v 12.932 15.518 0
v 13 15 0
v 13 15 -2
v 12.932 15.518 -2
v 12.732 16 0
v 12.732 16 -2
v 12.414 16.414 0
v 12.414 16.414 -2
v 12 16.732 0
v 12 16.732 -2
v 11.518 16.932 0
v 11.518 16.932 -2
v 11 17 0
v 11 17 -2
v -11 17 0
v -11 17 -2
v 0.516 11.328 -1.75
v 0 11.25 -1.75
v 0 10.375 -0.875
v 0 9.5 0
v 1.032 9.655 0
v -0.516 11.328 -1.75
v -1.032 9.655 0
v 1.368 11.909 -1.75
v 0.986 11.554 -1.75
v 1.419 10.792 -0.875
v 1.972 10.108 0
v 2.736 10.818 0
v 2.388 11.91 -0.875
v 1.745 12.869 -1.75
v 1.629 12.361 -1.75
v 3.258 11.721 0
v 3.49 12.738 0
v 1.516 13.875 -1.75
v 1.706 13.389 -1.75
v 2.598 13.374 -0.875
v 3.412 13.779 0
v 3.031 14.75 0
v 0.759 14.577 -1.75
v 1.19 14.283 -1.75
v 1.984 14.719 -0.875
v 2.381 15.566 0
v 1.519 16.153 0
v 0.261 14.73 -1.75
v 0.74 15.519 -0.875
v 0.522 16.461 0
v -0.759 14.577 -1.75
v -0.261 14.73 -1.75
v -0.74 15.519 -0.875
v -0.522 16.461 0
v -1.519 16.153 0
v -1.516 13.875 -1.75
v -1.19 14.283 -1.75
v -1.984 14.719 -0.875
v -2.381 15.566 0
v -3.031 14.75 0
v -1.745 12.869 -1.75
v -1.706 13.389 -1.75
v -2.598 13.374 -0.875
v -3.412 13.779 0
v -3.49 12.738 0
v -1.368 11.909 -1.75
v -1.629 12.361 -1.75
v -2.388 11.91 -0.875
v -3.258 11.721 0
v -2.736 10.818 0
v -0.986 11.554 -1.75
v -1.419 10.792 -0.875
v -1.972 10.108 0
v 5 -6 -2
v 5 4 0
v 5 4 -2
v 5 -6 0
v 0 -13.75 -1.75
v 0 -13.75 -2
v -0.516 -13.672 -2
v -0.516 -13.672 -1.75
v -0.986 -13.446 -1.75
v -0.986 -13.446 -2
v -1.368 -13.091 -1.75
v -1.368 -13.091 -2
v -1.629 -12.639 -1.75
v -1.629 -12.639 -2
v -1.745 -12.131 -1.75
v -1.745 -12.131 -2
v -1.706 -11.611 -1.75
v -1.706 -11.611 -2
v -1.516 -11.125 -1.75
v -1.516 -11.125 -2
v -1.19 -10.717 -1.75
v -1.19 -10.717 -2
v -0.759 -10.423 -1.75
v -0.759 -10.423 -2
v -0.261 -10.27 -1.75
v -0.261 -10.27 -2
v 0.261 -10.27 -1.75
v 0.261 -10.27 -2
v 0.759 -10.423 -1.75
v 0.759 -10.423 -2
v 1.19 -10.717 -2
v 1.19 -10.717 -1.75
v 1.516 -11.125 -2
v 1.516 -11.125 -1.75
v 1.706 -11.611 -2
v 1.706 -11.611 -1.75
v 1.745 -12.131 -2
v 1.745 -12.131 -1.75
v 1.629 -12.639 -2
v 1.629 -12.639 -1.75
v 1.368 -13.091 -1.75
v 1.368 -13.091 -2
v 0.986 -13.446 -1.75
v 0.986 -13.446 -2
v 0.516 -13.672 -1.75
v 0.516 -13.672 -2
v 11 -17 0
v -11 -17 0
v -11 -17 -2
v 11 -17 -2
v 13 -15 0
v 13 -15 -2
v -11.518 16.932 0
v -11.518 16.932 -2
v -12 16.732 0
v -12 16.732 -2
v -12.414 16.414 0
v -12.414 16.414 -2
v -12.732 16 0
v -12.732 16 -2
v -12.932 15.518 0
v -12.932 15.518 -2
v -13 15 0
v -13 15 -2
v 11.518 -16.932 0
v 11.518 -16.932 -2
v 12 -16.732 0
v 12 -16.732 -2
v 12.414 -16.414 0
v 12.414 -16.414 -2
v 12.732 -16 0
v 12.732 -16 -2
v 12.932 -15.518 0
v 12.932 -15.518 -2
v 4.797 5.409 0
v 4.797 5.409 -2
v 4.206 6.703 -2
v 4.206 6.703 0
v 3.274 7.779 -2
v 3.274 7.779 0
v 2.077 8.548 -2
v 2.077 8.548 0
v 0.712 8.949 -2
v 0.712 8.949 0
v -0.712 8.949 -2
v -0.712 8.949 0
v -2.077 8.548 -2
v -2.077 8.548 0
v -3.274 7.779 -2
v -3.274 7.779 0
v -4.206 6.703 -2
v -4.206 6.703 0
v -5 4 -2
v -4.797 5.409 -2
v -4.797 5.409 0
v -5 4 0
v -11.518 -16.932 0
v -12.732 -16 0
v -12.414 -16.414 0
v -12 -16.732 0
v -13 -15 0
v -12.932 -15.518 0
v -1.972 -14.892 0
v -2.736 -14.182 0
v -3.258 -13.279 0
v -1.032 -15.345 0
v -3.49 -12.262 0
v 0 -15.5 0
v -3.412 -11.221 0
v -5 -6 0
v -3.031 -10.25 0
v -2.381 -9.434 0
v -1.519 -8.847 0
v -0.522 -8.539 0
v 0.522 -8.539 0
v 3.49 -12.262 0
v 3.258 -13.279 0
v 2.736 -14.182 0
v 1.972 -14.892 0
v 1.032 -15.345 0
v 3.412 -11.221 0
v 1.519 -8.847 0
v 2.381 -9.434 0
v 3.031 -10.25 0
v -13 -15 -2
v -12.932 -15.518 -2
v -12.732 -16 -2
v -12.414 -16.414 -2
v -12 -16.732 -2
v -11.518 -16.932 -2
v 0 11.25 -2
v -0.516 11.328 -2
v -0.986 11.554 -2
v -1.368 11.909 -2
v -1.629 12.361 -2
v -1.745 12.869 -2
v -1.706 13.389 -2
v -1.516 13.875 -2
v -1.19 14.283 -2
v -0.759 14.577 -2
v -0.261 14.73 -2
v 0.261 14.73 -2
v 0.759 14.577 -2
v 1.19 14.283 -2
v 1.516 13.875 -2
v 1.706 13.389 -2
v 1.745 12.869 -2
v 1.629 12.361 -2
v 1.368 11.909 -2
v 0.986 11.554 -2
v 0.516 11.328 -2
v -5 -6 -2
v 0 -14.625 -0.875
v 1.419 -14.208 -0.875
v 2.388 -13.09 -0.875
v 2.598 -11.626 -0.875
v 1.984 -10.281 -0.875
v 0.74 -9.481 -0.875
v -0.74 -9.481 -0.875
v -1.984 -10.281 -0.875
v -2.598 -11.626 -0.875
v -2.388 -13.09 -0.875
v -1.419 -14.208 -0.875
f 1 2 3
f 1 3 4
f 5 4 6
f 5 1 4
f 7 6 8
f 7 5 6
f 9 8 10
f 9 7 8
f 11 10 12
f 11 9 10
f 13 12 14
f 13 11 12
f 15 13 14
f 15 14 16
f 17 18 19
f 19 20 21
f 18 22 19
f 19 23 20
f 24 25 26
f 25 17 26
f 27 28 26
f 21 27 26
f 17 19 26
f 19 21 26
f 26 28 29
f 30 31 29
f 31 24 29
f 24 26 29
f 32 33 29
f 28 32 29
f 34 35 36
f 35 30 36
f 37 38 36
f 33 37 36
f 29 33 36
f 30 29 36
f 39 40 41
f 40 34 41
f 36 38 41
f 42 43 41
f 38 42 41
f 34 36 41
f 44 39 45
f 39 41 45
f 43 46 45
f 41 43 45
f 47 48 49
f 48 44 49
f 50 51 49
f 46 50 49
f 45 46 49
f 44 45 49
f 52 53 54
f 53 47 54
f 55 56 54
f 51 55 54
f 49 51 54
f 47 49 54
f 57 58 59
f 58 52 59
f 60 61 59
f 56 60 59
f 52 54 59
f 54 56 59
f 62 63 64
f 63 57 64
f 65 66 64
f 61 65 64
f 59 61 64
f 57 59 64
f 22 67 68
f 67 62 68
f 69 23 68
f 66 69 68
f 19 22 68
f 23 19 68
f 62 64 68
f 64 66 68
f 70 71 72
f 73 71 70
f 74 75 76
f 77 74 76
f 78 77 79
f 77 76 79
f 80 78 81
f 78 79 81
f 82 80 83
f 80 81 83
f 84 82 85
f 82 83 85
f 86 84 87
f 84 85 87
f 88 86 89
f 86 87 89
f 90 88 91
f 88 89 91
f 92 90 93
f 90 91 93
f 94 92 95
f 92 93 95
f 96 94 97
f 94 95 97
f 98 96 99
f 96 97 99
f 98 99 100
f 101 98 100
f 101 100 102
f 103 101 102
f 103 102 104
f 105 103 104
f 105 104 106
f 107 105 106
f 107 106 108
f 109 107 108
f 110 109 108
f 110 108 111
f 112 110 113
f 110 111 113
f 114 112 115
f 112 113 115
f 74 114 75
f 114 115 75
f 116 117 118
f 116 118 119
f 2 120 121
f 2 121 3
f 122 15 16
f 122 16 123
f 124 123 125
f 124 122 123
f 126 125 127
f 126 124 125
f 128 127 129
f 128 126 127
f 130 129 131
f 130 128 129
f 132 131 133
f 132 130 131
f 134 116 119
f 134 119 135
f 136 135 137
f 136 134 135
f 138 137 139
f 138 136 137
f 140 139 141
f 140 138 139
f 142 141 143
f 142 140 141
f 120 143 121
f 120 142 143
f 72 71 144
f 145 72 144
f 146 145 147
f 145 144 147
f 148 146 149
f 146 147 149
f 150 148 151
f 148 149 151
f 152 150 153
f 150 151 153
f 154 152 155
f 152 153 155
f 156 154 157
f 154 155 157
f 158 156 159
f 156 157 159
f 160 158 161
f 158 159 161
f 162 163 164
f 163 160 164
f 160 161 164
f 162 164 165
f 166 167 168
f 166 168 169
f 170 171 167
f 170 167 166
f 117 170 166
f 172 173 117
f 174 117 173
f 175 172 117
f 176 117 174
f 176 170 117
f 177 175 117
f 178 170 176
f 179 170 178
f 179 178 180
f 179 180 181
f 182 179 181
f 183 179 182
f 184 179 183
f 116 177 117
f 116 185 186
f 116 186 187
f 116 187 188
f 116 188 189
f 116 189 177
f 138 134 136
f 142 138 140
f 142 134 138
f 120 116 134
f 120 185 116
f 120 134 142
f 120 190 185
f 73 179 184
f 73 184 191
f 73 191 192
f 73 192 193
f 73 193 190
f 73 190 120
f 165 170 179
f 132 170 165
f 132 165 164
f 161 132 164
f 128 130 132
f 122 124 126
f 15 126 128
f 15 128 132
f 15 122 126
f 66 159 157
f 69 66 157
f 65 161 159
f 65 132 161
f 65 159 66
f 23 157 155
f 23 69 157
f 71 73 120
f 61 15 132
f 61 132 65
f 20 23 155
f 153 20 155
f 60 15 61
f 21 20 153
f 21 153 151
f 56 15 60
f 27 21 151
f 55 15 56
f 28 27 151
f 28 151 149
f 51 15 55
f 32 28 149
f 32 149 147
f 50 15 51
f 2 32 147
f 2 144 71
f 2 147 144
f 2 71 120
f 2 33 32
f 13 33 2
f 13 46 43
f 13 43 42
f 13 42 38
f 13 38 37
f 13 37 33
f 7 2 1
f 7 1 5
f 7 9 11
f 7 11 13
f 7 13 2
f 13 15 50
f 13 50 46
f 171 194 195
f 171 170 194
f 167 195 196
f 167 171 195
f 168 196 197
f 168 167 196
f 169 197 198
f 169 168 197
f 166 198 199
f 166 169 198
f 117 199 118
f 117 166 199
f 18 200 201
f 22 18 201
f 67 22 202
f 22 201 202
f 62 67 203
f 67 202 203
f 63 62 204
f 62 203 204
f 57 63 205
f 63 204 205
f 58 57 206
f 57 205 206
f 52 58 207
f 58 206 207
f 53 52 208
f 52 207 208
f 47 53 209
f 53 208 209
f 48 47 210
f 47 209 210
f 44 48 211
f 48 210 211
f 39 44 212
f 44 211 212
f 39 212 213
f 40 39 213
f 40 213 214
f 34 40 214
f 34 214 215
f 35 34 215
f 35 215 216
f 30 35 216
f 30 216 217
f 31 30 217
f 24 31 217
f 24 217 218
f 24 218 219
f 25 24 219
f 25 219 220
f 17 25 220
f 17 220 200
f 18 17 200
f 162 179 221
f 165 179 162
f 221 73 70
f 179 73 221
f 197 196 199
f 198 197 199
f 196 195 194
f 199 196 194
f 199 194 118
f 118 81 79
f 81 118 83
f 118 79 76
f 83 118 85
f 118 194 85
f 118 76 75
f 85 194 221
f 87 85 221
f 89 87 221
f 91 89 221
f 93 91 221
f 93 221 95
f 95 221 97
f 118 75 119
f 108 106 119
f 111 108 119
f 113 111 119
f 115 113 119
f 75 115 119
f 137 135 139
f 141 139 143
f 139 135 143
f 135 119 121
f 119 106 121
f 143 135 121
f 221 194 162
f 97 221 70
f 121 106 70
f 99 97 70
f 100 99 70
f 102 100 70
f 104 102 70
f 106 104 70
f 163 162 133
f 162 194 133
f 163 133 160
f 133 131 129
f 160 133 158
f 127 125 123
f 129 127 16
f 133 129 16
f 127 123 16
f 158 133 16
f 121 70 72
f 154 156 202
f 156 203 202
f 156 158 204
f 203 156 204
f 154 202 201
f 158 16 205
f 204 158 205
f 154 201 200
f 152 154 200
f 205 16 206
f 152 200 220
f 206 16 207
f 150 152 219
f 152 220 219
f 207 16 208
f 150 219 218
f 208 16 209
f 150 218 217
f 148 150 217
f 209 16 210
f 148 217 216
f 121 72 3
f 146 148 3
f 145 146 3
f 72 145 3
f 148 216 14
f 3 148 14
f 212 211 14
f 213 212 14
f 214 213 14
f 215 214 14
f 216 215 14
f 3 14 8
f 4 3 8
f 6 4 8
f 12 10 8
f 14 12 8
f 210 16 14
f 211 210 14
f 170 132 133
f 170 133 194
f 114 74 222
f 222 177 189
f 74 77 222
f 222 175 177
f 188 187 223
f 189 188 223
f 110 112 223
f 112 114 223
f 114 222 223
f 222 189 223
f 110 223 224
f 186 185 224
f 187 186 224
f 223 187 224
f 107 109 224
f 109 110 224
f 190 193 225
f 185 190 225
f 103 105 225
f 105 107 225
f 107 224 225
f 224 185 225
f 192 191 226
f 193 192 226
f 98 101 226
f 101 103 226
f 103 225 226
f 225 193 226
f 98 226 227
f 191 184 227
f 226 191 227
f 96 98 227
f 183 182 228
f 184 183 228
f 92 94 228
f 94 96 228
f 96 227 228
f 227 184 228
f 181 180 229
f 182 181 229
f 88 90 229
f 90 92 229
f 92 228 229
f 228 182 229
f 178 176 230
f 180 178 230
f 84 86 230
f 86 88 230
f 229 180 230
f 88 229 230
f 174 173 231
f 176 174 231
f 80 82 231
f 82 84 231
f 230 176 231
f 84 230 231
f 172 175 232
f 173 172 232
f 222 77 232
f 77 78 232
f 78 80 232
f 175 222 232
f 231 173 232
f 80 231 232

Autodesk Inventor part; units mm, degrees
ref_plane "YZ Plane" through (0, 0, 0) normal (1, 0, 0) x (0, 1, 0)
ref_plane "XZ Plane" through (0, 0, 0) normal (0, 1, 0) x (-1, 0, 0)
ref_plane "XY Plane" through (0, 0, 0) normal (0, 0, 1) x (1, 0, 0)
sketch "Skizze1" plane through (0, 0, 0) normal (0, 0, 1) x (1, 0, 0)
  line L0 (-18.7799, 0) -> (18.7799, 0) projected
  line L1 (0, -24.3799) -> (0, 24.3799) projected
  line L2 (-11, -17) -> (11, -17)
  line L3 (13, -15) -> (13, 15)
  line L4 (11, 17) -> (-11, 17)
  line L5 (-13, 15) -> (-13, -15)
  line L6 (-13, -17) -> (13, 17) construction
  line L7 (13, -17) -> (-13, 17) construction
  arc A0 (-11, 17) -> (-13, 15) centre (-11, 15) ccw
  arc A1 (13, 15) -> (11, 17) centre (11, 15) ccw
  arc A2 (11, -17) -> (13, -15) centre (11, -15) ccw
  arc A3 (-13, -15) -> (-11, -17) centre (-11, -15) ccw
  point P0 (0, 0)
  dimension "d0" = 26
  dimension "d1" = 34
  dimension "d2" = 2
extrude "Extrusion1" add sketch "Skizze1" against normal blind 2
sketch "Skizze2" plane through (0, 0, 0) normal (0, 0, 1) x (1, 0, 0)
  line L0 (13, -15) -> (13, 15) projected
  arc A0 (13, 15) -> (11, 17) centre (11, 15) ccw projected
  line L1 (11, 17) -> (-11, 17) projected
  arc A1 (-11, 17) -> (-13, 15) centre (-11, 15) ccw projected
  line L2 (-13, 15) -> (-13, -15) projected
  arc A2 (-13, -15) -> (-11, -17) centre (-11, -15) ccw projected
  line L3 (-11, -17) -> (11, -17) projected
  arc A3 (11, -17) -> (13, -15) centre (11, -15) ccw projected
  line L4 (-18.7799, 0) -> (18.7799, 0) projected
  line L5 (0, -24.3799) -> (0, 24.3799) projected
  line L6 (-5, 4) -> (5, 4)
  line L7 (5, 4) -> (5, -6)
  line L8 (5, -6) -> (-5, -6)
  line L9 (-5, -6) -> (-5, 4)
  arc A4 (5, 4) -> (-5, 4) centre (0, 4) ccw
  point P0 (0, 0)
  dimension "d5" = 10
  dimension "d6" = 10
  dimension "d7" = 11
  dimension "d8" = 5
extrude "Extrusion2" cut sketch "Skizze2" against normal blind 2 contours L7 L8 L5 L4 | L4 L5 L6 L7 | L5 L8 L9 L4 | L4 L9 L6 L5 | L6 L5 A4 | L6 A4 L5
sketch "Skizze3" plane through (0, 0, 0) normal (0, 0, 1) x (1, 0, 0)
  line L0 (5, 4) -> (5, -6) projected
  line L1 (5, -6) -> (-5, -6) projected
  line L2 (-5, -6) -> (-5, 4) projected
  arc A0 (5, 4) -> (-5, 4) centre (0, 4) ccw projected
  line L3 (13, -15) -> (13, 15) projected
  arc A1 (13, 15) -> (11, 17) centre (11, 15) ccw projected
  line L4 (11, 17) -> (-11, 17) projected
  arc A2 (-11, 17) -> (-13, 15) centre (-11, 15) ccw projected
  line L5 (-13, 15) -> (-13, -15) projected
  arc A3 (-13, -15) -> (-11, -17) centre (-11, -15) ccw projected
  line L6 (-11, -17) -> (11, -17) projected
  arc A4 (11, -17) -> (13, -15) centre (11, -15) ccw projected
  line L7 (-18.7799, 0) -> (18.7799, 0) projected
  line L8 (0, -24.3799) -> (0, 24.3799) projected
  point P0 (0, 0)
  point P1 (0, -12)
  point P2 (0, 13)
  dimension "d11" = 25
  dimension "d12" = 5
hole "Bohrung1" at (0, -12, 0) at (0, 13, 0) direction (0, 0, -1) diameter 3.5 end through all countersink diameter 7 countersink angle 90
properties part number "Rückwand Deckplatte" material "PVC, hart"
